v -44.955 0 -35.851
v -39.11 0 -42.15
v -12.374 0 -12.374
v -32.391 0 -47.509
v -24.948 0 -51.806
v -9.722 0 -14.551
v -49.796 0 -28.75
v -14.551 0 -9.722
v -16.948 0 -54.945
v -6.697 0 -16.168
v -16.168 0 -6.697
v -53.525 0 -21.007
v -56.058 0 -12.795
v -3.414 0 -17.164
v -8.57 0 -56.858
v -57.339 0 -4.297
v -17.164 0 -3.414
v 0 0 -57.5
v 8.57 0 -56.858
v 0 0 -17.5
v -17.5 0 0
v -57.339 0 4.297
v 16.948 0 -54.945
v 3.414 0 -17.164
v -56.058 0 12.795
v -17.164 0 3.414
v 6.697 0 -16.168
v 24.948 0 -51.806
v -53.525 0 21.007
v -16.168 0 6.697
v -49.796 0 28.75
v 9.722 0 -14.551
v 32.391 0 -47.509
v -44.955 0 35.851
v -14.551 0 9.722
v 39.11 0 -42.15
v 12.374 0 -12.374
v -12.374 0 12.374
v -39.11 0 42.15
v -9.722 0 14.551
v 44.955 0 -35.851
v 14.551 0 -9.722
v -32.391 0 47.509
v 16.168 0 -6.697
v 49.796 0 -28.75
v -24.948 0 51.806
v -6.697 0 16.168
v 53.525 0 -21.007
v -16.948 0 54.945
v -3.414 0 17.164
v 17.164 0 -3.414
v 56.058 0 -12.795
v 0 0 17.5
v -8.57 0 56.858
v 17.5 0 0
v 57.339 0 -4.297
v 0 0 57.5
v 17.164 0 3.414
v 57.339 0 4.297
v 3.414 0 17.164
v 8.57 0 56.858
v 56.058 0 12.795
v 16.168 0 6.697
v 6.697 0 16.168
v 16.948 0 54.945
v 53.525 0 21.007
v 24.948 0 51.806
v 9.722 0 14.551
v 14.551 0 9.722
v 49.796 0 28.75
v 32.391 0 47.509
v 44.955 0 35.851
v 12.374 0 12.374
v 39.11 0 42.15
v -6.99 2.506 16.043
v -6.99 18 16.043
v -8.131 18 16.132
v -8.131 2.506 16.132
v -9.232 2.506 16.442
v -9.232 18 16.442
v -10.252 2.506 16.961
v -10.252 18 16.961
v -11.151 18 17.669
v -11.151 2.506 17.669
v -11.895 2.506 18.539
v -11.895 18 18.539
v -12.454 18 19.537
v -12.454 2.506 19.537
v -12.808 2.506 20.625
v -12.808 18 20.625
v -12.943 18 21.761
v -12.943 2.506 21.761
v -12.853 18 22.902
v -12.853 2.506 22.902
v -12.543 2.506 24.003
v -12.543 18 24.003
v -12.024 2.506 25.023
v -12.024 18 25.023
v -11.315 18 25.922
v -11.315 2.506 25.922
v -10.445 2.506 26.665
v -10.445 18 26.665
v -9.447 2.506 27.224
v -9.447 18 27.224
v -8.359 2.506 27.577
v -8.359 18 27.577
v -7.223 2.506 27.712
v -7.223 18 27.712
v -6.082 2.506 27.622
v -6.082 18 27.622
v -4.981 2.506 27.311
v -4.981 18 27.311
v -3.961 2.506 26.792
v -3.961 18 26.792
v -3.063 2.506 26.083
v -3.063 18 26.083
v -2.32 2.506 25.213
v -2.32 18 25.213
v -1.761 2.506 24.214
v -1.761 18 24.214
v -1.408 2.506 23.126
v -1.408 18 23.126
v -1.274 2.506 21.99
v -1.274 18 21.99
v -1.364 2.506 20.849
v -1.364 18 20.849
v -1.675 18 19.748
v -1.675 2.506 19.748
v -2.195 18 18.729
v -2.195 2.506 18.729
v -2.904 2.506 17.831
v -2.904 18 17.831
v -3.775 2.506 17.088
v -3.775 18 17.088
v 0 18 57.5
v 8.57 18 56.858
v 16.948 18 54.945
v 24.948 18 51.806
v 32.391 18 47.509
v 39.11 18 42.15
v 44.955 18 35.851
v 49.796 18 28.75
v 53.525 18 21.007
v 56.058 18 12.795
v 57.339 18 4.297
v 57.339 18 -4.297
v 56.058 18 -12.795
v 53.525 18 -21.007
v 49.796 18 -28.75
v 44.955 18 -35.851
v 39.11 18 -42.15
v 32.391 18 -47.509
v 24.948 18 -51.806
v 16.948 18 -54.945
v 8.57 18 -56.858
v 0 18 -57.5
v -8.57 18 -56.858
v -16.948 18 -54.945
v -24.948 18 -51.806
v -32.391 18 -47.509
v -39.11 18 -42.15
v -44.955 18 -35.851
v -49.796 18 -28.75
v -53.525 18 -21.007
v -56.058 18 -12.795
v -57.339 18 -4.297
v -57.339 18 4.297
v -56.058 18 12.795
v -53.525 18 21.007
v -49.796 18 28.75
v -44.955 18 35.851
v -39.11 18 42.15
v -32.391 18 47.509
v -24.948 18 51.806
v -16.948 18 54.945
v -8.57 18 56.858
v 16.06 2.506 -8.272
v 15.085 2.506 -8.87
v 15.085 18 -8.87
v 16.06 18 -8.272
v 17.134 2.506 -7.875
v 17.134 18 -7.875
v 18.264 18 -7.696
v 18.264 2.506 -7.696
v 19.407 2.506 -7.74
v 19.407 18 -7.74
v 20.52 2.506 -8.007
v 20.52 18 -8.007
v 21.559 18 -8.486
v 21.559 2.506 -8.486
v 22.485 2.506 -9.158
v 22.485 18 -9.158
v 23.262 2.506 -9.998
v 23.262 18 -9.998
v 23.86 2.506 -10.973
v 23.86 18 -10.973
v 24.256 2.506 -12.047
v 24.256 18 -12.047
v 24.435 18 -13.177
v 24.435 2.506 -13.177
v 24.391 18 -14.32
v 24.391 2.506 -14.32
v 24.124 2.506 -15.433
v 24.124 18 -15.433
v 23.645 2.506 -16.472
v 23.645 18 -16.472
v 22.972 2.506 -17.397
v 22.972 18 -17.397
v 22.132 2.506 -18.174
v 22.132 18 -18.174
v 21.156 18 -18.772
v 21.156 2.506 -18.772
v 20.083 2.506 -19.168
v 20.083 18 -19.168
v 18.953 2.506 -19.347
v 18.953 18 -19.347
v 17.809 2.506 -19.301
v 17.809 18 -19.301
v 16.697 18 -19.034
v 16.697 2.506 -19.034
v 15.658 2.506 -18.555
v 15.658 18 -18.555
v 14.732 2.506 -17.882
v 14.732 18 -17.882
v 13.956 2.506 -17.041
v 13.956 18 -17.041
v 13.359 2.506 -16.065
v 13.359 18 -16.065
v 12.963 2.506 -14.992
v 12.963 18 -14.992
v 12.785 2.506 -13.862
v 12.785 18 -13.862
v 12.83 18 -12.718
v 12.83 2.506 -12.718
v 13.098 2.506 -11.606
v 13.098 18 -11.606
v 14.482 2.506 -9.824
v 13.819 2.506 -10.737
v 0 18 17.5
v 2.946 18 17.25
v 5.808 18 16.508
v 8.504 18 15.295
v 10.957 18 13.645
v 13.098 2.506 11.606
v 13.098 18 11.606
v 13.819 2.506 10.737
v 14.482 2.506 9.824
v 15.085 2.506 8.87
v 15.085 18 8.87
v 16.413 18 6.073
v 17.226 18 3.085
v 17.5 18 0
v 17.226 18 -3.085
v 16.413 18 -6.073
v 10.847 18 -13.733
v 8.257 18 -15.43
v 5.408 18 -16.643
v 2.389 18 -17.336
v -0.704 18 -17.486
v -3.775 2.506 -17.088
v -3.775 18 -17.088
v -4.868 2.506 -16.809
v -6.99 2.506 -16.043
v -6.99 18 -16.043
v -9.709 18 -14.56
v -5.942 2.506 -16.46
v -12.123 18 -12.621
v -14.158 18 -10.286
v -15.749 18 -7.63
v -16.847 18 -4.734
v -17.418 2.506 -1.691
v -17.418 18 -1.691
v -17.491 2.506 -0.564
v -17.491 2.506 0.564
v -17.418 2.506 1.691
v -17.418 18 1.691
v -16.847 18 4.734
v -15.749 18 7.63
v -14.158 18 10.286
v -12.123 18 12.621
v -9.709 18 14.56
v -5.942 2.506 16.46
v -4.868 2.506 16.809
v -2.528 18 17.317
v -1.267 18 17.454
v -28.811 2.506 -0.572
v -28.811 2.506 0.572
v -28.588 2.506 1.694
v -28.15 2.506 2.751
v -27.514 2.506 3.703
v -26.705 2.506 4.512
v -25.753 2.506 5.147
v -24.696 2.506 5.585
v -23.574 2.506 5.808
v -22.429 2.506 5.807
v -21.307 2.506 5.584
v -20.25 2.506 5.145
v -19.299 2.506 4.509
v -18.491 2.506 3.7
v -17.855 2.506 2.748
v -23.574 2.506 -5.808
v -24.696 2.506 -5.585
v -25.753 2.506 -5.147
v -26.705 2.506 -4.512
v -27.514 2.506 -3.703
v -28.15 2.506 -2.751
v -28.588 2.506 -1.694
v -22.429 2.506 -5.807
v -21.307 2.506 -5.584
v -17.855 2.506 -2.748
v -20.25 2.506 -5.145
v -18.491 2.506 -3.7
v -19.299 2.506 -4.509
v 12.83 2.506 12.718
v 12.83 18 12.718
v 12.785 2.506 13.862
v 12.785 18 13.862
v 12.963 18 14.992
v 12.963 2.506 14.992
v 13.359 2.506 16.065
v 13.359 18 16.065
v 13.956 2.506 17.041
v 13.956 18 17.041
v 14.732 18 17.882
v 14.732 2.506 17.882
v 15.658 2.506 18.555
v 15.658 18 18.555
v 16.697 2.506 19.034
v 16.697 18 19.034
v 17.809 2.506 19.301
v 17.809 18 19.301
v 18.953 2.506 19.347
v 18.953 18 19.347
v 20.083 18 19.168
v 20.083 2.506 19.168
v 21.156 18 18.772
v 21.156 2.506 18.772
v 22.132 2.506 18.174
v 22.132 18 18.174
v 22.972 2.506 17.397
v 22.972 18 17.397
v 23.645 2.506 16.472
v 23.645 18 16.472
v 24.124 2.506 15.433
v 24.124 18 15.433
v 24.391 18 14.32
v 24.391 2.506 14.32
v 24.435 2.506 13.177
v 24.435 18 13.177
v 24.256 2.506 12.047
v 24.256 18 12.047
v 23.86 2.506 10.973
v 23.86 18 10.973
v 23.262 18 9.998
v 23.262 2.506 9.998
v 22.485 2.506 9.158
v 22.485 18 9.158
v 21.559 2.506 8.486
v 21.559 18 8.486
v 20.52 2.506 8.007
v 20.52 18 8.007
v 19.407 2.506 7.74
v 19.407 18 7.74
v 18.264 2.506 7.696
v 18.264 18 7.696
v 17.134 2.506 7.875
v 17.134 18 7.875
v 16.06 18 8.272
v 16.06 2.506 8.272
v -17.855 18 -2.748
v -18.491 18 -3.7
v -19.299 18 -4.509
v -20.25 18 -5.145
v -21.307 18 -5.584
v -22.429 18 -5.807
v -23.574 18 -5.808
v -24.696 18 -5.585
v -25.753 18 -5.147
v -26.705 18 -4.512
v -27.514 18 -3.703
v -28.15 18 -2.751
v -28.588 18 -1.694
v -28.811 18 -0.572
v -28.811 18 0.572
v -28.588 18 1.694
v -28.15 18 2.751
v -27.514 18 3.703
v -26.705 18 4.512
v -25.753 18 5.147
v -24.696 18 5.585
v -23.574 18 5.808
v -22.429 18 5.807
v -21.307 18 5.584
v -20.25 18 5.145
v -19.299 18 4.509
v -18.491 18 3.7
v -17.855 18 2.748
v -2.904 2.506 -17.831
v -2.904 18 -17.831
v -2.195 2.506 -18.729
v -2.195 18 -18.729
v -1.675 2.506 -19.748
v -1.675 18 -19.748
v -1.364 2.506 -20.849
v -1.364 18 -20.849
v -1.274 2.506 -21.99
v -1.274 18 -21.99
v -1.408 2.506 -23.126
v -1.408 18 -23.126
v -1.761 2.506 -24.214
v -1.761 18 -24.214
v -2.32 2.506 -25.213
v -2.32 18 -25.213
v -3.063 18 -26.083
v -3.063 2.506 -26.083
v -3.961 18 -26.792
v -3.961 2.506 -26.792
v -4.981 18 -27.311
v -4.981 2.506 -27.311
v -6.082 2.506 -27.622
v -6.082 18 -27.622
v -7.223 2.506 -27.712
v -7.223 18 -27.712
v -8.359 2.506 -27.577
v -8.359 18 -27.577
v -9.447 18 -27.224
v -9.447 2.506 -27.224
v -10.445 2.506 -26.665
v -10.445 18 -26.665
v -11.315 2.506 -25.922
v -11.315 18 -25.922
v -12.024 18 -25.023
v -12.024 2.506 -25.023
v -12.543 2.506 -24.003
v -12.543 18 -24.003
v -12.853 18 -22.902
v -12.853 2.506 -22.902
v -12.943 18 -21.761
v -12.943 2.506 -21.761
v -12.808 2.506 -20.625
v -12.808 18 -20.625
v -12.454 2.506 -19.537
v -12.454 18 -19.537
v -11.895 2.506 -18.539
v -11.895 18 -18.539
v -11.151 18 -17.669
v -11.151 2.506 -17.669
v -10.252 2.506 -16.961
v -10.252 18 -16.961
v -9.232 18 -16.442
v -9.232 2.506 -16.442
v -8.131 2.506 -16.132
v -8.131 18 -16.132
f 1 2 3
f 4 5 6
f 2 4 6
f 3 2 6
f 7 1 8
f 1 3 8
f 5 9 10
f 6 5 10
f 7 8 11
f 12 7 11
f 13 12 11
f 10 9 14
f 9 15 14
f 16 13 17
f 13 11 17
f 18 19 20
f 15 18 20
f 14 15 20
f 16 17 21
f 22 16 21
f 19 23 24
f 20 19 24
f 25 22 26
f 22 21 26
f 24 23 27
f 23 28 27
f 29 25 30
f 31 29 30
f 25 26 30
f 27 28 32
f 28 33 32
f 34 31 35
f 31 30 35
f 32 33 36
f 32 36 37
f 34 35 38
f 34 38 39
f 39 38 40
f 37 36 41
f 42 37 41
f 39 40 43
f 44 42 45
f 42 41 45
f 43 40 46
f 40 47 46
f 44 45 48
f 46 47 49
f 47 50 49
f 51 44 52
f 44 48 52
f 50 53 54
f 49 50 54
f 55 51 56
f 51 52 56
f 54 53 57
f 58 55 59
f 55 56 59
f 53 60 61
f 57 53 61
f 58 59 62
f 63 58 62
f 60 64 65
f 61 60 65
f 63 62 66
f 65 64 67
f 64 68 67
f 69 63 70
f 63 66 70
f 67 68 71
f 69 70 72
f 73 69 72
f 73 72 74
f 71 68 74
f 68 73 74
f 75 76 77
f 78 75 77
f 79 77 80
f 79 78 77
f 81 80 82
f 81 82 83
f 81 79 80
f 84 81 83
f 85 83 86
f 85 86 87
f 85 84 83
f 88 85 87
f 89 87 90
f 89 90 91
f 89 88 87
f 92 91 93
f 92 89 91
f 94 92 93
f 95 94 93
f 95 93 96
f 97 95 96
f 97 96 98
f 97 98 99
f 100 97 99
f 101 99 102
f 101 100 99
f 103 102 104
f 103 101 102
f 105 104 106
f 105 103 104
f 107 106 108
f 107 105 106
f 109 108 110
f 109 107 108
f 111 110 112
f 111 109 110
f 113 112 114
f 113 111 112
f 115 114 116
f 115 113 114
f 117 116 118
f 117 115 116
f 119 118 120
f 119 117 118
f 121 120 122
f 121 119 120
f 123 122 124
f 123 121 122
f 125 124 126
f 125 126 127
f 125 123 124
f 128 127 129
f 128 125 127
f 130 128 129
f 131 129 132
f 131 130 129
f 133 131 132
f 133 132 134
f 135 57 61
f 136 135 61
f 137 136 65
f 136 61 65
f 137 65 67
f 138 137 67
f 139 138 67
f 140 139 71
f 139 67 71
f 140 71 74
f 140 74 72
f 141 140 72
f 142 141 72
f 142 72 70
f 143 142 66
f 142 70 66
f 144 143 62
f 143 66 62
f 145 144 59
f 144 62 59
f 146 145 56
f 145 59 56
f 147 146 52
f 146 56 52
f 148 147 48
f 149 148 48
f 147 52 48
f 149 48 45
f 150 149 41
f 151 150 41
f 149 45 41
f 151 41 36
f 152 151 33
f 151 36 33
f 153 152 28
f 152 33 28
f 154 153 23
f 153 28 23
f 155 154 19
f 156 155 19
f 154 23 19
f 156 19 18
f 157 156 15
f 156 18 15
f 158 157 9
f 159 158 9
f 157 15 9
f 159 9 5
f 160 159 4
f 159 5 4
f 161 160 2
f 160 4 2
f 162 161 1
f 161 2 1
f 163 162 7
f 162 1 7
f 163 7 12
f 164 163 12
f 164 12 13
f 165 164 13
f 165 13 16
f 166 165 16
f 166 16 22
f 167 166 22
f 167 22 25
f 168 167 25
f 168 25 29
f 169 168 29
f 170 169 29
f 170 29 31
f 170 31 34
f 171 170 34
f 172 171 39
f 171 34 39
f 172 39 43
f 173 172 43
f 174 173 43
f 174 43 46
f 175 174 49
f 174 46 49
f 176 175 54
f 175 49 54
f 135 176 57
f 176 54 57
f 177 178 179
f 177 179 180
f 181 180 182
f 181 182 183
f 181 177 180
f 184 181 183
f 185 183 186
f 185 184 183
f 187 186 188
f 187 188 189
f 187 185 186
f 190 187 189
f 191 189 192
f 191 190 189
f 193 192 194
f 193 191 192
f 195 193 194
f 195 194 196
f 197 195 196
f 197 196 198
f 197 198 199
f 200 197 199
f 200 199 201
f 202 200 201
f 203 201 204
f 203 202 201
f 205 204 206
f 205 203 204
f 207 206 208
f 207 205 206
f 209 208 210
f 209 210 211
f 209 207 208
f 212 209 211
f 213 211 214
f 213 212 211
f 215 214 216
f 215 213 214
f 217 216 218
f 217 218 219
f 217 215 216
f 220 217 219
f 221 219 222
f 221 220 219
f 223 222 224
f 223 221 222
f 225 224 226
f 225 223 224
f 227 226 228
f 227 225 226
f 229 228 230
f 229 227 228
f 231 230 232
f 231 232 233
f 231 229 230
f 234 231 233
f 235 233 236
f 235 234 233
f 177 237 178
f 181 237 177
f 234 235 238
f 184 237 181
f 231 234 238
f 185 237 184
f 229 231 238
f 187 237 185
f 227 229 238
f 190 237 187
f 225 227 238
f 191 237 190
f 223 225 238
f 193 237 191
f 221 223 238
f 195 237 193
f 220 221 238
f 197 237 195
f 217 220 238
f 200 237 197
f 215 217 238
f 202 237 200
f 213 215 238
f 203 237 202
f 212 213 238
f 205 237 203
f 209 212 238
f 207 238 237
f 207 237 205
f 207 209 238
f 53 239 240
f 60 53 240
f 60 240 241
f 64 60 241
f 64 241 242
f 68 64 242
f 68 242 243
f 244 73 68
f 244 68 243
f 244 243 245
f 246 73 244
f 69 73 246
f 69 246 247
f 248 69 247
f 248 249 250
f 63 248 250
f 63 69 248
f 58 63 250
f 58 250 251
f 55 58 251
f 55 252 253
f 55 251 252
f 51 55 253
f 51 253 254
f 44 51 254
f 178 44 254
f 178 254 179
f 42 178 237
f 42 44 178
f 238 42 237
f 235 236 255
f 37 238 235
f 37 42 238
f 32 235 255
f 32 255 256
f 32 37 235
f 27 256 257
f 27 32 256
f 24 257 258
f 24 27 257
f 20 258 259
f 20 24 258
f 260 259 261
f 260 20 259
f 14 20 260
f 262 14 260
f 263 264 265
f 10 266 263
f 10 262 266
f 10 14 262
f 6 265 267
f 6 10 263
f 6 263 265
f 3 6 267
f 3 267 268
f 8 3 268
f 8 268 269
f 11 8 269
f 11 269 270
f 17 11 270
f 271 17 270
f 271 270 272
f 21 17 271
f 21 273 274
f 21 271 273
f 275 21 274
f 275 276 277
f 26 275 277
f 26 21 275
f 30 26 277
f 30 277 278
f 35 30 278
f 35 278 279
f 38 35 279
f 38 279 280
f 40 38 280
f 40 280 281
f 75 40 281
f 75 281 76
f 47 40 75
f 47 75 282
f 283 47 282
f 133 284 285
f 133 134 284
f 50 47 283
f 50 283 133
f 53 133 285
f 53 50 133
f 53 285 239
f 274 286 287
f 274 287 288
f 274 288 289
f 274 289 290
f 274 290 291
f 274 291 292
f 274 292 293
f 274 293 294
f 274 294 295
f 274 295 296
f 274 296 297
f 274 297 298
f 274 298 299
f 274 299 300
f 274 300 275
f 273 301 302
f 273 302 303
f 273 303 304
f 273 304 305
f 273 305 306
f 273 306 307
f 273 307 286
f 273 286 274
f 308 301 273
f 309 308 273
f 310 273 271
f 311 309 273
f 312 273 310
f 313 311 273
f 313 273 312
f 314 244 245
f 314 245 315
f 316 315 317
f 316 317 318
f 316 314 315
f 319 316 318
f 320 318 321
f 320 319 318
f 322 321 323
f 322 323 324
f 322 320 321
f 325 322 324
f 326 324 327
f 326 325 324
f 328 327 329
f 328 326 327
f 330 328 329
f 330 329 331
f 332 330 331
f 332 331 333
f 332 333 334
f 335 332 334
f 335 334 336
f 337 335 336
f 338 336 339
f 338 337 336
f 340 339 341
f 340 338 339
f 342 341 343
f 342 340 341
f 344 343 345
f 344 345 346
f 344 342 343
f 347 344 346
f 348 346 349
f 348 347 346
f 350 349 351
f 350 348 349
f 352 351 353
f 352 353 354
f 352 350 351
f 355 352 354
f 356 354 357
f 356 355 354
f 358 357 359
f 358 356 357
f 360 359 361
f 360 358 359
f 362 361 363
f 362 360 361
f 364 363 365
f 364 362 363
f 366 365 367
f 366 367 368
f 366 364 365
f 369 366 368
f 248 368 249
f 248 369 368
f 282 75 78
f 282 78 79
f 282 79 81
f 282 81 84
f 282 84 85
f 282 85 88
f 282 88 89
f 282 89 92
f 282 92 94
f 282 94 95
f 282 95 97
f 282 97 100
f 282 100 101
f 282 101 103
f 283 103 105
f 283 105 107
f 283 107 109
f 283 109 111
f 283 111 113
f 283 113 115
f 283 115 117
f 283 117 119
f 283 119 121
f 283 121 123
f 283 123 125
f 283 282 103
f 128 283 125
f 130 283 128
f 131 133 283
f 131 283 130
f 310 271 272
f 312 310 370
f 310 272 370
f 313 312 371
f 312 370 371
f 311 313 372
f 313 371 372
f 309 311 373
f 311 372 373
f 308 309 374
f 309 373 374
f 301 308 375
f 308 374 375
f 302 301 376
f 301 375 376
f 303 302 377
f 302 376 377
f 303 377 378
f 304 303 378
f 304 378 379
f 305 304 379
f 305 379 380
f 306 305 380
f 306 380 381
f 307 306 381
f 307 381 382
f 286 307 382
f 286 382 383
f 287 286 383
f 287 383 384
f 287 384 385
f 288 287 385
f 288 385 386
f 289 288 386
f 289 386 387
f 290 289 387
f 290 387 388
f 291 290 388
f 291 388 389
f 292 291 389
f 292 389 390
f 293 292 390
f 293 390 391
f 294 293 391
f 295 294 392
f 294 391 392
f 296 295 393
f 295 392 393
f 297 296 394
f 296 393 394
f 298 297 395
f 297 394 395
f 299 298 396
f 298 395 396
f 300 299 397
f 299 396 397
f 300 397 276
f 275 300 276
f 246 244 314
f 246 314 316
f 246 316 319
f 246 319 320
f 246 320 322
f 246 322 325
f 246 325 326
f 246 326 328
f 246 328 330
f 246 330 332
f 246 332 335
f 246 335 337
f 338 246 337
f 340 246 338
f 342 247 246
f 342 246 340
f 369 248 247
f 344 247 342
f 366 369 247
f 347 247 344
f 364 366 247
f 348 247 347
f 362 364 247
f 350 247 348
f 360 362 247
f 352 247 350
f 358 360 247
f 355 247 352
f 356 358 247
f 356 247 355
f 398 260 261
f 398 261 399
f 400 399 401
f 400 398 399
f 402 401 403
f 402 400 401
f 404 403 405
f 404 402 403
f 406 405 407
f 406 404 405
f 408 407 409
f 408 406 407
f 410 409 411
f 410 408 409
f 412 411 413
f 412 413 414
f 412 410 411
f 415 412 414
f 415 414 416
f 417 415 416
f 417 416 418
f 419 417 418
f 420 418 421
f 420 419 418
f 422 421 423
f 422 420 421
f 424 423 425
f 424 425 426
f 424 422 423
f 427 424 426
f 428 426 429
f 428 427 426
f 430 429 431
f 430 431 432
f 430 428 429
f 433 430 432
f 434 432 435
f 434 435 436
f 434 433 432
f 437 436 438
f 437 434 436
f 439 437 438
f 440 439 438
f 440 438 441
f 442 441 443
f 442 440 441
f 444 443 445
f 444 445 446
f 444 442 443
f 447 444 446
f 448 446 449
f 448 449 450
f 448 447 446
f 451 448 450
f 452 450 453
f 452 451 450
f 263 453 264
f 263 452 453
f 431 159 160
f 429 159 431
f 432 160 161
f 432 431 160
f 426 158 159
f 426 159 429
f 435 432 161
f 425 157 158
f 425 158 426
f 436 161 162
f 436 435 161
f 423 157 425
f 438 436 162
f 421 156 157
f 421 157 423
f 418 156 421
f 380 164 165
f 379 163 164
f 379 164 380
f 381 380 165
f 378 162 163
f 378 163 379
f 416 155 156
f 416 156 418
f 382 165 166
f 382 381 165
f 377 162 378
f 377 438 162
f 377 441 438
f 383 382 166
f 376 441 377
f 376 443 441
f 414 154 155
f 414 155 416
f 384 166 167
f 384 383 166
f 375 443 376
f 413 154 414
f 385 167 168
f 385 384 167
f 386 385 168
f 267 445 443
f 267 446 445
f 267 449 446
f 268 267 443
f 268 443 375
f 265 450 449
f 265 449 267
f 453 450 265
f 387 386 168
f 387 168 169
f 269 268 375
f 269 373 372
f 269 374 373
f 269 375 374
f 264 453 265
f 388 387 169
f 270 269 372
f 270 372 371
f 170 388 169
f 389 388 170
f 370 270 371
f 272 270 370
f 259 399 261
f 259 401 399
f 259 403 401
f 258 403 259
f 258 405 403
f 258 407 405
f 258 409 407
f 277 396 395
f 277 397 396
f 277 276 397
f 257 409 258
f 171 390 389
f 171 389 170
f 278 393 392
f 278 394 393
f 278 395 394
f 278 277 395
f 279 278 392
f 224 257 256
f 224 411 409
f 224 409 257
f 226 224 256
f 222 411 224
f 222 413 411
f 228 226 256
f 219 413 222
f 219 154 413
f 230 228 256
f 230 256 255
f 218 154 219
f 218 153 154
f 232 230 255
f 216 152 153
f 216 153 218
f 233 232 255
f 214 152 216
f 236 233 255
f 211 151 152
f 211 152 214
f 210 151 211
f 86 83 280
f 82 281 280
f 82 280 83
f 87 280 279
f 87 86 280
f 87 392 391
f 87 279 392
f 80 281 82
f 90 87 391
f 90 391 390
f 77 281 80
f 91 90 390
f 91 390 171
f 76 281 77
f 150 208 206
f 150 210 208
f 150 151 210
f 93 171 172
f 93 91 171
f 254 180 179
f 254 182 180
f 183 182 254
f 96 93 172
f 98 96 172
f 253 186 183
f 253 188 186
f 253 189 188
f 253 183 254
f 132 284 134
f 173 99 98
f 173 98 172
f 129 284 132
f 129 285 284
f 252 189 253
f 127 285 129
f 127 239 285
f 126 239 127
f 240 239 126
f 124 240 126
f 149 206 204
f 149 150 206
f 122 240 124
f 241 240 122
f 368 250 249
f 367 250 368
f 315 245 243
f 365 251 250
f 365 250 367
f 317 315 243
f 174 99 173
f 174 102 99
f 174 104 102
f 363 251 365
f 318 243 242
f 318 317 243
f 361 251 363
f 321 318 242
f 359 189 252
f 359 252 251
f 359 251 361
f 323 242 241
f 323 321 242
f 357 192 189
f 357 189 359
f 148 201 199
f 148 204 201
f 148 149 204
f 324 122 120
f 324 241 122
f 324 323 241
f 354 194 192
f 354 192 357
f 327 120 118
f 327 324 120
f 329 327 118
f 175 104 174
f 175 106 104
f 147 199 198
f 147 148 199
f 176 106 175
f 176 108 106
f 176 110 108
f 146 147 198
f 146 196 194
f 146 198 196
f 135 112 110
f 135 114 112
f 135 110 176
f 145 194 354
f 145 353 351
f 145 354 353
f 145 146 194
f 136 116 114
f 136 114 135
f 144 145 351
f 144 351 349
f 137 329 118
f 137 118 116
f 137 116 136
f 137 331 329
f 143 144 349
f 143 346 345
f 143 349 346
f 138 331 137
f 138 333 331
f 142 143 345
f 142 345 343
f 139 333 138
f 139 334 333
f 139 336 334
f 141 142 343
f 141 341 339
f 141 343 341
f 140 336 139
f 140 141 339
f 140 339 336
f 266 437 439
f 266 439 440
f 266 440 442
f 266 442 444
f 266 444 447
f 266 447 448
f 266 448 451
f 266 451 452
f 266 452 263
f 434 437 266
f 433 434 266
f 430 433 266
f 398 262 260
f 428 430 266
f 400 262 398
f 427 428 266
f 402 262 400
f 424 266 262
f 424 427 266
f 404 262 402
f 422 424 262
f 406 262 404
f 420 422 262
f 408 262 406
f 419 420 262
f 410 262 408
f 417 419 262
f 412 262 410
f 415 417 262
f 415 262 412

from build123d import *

# Parameters (mm, degrees)
SKETCH1_R           = 57.5
BOSS_EXTRUDE1_DEPTH = 18
SKETCH2_R           = 17.5
CUT_EXTRUDE1_DEPTH  = 84.285653026
SKETCH3_R           = 5.835493776
CUT_EXTRUDE2_DEPTH  = 15.493778772
CIRPATTERN1_COUNT   = 5


with BuildPart() as part:
    # Sketch1 → Boss-Extrude1 (new body)
    with BuildSketch(Plane(origin=(0, 0, 0), x_dir=(1, 0, 0), z_dir=(0, 1, 0))):
        Circle(SKETCH1_R)
    extrude(amount=BOSS_EXTRUDE1_DEPTH)

    # Sketch2 → Cut-Extrude1 (cut, through all)
    with BuildSketch(Plane(origin=(0, 0, 0), x_dir=(1, 0, 0), z_dir=(0, 1, 0))):
        Circle(SKETCH2_R)
    extrude(amount=CUT_EXTRUDE1_DEPTH, mode=Mode.SUBTRACT)

    # Sketch3 → Cut-Extrude2 (cut)
    with BuildSketch(Plane(origin=(0, 18, 0), x_dir=(1, 0, 0), z_dir=(0, 1, 0))):
        with Locations((-23.003411052, 0)):
            Circle(SKETCH3_R)
    cut_extrude2 = extrude(amount=-CUT_EXTRUDE2_DEPTH, mode=Mode.SUBTRACT)

    # CirPattern1: Cut-Extrude2 ×5 about axis
    cirpattern1_axis = Axis((0, 0, 0), (0, 1, 0))
    for i in range(1, CIRPATTERN1_COUNT):
        add(cut_extrude2.rotate(cirpattern1_axis, i * 360 / CIRPATTERN1_COUNT), mode=Mode.SUBTRACT)


solid = part.part
